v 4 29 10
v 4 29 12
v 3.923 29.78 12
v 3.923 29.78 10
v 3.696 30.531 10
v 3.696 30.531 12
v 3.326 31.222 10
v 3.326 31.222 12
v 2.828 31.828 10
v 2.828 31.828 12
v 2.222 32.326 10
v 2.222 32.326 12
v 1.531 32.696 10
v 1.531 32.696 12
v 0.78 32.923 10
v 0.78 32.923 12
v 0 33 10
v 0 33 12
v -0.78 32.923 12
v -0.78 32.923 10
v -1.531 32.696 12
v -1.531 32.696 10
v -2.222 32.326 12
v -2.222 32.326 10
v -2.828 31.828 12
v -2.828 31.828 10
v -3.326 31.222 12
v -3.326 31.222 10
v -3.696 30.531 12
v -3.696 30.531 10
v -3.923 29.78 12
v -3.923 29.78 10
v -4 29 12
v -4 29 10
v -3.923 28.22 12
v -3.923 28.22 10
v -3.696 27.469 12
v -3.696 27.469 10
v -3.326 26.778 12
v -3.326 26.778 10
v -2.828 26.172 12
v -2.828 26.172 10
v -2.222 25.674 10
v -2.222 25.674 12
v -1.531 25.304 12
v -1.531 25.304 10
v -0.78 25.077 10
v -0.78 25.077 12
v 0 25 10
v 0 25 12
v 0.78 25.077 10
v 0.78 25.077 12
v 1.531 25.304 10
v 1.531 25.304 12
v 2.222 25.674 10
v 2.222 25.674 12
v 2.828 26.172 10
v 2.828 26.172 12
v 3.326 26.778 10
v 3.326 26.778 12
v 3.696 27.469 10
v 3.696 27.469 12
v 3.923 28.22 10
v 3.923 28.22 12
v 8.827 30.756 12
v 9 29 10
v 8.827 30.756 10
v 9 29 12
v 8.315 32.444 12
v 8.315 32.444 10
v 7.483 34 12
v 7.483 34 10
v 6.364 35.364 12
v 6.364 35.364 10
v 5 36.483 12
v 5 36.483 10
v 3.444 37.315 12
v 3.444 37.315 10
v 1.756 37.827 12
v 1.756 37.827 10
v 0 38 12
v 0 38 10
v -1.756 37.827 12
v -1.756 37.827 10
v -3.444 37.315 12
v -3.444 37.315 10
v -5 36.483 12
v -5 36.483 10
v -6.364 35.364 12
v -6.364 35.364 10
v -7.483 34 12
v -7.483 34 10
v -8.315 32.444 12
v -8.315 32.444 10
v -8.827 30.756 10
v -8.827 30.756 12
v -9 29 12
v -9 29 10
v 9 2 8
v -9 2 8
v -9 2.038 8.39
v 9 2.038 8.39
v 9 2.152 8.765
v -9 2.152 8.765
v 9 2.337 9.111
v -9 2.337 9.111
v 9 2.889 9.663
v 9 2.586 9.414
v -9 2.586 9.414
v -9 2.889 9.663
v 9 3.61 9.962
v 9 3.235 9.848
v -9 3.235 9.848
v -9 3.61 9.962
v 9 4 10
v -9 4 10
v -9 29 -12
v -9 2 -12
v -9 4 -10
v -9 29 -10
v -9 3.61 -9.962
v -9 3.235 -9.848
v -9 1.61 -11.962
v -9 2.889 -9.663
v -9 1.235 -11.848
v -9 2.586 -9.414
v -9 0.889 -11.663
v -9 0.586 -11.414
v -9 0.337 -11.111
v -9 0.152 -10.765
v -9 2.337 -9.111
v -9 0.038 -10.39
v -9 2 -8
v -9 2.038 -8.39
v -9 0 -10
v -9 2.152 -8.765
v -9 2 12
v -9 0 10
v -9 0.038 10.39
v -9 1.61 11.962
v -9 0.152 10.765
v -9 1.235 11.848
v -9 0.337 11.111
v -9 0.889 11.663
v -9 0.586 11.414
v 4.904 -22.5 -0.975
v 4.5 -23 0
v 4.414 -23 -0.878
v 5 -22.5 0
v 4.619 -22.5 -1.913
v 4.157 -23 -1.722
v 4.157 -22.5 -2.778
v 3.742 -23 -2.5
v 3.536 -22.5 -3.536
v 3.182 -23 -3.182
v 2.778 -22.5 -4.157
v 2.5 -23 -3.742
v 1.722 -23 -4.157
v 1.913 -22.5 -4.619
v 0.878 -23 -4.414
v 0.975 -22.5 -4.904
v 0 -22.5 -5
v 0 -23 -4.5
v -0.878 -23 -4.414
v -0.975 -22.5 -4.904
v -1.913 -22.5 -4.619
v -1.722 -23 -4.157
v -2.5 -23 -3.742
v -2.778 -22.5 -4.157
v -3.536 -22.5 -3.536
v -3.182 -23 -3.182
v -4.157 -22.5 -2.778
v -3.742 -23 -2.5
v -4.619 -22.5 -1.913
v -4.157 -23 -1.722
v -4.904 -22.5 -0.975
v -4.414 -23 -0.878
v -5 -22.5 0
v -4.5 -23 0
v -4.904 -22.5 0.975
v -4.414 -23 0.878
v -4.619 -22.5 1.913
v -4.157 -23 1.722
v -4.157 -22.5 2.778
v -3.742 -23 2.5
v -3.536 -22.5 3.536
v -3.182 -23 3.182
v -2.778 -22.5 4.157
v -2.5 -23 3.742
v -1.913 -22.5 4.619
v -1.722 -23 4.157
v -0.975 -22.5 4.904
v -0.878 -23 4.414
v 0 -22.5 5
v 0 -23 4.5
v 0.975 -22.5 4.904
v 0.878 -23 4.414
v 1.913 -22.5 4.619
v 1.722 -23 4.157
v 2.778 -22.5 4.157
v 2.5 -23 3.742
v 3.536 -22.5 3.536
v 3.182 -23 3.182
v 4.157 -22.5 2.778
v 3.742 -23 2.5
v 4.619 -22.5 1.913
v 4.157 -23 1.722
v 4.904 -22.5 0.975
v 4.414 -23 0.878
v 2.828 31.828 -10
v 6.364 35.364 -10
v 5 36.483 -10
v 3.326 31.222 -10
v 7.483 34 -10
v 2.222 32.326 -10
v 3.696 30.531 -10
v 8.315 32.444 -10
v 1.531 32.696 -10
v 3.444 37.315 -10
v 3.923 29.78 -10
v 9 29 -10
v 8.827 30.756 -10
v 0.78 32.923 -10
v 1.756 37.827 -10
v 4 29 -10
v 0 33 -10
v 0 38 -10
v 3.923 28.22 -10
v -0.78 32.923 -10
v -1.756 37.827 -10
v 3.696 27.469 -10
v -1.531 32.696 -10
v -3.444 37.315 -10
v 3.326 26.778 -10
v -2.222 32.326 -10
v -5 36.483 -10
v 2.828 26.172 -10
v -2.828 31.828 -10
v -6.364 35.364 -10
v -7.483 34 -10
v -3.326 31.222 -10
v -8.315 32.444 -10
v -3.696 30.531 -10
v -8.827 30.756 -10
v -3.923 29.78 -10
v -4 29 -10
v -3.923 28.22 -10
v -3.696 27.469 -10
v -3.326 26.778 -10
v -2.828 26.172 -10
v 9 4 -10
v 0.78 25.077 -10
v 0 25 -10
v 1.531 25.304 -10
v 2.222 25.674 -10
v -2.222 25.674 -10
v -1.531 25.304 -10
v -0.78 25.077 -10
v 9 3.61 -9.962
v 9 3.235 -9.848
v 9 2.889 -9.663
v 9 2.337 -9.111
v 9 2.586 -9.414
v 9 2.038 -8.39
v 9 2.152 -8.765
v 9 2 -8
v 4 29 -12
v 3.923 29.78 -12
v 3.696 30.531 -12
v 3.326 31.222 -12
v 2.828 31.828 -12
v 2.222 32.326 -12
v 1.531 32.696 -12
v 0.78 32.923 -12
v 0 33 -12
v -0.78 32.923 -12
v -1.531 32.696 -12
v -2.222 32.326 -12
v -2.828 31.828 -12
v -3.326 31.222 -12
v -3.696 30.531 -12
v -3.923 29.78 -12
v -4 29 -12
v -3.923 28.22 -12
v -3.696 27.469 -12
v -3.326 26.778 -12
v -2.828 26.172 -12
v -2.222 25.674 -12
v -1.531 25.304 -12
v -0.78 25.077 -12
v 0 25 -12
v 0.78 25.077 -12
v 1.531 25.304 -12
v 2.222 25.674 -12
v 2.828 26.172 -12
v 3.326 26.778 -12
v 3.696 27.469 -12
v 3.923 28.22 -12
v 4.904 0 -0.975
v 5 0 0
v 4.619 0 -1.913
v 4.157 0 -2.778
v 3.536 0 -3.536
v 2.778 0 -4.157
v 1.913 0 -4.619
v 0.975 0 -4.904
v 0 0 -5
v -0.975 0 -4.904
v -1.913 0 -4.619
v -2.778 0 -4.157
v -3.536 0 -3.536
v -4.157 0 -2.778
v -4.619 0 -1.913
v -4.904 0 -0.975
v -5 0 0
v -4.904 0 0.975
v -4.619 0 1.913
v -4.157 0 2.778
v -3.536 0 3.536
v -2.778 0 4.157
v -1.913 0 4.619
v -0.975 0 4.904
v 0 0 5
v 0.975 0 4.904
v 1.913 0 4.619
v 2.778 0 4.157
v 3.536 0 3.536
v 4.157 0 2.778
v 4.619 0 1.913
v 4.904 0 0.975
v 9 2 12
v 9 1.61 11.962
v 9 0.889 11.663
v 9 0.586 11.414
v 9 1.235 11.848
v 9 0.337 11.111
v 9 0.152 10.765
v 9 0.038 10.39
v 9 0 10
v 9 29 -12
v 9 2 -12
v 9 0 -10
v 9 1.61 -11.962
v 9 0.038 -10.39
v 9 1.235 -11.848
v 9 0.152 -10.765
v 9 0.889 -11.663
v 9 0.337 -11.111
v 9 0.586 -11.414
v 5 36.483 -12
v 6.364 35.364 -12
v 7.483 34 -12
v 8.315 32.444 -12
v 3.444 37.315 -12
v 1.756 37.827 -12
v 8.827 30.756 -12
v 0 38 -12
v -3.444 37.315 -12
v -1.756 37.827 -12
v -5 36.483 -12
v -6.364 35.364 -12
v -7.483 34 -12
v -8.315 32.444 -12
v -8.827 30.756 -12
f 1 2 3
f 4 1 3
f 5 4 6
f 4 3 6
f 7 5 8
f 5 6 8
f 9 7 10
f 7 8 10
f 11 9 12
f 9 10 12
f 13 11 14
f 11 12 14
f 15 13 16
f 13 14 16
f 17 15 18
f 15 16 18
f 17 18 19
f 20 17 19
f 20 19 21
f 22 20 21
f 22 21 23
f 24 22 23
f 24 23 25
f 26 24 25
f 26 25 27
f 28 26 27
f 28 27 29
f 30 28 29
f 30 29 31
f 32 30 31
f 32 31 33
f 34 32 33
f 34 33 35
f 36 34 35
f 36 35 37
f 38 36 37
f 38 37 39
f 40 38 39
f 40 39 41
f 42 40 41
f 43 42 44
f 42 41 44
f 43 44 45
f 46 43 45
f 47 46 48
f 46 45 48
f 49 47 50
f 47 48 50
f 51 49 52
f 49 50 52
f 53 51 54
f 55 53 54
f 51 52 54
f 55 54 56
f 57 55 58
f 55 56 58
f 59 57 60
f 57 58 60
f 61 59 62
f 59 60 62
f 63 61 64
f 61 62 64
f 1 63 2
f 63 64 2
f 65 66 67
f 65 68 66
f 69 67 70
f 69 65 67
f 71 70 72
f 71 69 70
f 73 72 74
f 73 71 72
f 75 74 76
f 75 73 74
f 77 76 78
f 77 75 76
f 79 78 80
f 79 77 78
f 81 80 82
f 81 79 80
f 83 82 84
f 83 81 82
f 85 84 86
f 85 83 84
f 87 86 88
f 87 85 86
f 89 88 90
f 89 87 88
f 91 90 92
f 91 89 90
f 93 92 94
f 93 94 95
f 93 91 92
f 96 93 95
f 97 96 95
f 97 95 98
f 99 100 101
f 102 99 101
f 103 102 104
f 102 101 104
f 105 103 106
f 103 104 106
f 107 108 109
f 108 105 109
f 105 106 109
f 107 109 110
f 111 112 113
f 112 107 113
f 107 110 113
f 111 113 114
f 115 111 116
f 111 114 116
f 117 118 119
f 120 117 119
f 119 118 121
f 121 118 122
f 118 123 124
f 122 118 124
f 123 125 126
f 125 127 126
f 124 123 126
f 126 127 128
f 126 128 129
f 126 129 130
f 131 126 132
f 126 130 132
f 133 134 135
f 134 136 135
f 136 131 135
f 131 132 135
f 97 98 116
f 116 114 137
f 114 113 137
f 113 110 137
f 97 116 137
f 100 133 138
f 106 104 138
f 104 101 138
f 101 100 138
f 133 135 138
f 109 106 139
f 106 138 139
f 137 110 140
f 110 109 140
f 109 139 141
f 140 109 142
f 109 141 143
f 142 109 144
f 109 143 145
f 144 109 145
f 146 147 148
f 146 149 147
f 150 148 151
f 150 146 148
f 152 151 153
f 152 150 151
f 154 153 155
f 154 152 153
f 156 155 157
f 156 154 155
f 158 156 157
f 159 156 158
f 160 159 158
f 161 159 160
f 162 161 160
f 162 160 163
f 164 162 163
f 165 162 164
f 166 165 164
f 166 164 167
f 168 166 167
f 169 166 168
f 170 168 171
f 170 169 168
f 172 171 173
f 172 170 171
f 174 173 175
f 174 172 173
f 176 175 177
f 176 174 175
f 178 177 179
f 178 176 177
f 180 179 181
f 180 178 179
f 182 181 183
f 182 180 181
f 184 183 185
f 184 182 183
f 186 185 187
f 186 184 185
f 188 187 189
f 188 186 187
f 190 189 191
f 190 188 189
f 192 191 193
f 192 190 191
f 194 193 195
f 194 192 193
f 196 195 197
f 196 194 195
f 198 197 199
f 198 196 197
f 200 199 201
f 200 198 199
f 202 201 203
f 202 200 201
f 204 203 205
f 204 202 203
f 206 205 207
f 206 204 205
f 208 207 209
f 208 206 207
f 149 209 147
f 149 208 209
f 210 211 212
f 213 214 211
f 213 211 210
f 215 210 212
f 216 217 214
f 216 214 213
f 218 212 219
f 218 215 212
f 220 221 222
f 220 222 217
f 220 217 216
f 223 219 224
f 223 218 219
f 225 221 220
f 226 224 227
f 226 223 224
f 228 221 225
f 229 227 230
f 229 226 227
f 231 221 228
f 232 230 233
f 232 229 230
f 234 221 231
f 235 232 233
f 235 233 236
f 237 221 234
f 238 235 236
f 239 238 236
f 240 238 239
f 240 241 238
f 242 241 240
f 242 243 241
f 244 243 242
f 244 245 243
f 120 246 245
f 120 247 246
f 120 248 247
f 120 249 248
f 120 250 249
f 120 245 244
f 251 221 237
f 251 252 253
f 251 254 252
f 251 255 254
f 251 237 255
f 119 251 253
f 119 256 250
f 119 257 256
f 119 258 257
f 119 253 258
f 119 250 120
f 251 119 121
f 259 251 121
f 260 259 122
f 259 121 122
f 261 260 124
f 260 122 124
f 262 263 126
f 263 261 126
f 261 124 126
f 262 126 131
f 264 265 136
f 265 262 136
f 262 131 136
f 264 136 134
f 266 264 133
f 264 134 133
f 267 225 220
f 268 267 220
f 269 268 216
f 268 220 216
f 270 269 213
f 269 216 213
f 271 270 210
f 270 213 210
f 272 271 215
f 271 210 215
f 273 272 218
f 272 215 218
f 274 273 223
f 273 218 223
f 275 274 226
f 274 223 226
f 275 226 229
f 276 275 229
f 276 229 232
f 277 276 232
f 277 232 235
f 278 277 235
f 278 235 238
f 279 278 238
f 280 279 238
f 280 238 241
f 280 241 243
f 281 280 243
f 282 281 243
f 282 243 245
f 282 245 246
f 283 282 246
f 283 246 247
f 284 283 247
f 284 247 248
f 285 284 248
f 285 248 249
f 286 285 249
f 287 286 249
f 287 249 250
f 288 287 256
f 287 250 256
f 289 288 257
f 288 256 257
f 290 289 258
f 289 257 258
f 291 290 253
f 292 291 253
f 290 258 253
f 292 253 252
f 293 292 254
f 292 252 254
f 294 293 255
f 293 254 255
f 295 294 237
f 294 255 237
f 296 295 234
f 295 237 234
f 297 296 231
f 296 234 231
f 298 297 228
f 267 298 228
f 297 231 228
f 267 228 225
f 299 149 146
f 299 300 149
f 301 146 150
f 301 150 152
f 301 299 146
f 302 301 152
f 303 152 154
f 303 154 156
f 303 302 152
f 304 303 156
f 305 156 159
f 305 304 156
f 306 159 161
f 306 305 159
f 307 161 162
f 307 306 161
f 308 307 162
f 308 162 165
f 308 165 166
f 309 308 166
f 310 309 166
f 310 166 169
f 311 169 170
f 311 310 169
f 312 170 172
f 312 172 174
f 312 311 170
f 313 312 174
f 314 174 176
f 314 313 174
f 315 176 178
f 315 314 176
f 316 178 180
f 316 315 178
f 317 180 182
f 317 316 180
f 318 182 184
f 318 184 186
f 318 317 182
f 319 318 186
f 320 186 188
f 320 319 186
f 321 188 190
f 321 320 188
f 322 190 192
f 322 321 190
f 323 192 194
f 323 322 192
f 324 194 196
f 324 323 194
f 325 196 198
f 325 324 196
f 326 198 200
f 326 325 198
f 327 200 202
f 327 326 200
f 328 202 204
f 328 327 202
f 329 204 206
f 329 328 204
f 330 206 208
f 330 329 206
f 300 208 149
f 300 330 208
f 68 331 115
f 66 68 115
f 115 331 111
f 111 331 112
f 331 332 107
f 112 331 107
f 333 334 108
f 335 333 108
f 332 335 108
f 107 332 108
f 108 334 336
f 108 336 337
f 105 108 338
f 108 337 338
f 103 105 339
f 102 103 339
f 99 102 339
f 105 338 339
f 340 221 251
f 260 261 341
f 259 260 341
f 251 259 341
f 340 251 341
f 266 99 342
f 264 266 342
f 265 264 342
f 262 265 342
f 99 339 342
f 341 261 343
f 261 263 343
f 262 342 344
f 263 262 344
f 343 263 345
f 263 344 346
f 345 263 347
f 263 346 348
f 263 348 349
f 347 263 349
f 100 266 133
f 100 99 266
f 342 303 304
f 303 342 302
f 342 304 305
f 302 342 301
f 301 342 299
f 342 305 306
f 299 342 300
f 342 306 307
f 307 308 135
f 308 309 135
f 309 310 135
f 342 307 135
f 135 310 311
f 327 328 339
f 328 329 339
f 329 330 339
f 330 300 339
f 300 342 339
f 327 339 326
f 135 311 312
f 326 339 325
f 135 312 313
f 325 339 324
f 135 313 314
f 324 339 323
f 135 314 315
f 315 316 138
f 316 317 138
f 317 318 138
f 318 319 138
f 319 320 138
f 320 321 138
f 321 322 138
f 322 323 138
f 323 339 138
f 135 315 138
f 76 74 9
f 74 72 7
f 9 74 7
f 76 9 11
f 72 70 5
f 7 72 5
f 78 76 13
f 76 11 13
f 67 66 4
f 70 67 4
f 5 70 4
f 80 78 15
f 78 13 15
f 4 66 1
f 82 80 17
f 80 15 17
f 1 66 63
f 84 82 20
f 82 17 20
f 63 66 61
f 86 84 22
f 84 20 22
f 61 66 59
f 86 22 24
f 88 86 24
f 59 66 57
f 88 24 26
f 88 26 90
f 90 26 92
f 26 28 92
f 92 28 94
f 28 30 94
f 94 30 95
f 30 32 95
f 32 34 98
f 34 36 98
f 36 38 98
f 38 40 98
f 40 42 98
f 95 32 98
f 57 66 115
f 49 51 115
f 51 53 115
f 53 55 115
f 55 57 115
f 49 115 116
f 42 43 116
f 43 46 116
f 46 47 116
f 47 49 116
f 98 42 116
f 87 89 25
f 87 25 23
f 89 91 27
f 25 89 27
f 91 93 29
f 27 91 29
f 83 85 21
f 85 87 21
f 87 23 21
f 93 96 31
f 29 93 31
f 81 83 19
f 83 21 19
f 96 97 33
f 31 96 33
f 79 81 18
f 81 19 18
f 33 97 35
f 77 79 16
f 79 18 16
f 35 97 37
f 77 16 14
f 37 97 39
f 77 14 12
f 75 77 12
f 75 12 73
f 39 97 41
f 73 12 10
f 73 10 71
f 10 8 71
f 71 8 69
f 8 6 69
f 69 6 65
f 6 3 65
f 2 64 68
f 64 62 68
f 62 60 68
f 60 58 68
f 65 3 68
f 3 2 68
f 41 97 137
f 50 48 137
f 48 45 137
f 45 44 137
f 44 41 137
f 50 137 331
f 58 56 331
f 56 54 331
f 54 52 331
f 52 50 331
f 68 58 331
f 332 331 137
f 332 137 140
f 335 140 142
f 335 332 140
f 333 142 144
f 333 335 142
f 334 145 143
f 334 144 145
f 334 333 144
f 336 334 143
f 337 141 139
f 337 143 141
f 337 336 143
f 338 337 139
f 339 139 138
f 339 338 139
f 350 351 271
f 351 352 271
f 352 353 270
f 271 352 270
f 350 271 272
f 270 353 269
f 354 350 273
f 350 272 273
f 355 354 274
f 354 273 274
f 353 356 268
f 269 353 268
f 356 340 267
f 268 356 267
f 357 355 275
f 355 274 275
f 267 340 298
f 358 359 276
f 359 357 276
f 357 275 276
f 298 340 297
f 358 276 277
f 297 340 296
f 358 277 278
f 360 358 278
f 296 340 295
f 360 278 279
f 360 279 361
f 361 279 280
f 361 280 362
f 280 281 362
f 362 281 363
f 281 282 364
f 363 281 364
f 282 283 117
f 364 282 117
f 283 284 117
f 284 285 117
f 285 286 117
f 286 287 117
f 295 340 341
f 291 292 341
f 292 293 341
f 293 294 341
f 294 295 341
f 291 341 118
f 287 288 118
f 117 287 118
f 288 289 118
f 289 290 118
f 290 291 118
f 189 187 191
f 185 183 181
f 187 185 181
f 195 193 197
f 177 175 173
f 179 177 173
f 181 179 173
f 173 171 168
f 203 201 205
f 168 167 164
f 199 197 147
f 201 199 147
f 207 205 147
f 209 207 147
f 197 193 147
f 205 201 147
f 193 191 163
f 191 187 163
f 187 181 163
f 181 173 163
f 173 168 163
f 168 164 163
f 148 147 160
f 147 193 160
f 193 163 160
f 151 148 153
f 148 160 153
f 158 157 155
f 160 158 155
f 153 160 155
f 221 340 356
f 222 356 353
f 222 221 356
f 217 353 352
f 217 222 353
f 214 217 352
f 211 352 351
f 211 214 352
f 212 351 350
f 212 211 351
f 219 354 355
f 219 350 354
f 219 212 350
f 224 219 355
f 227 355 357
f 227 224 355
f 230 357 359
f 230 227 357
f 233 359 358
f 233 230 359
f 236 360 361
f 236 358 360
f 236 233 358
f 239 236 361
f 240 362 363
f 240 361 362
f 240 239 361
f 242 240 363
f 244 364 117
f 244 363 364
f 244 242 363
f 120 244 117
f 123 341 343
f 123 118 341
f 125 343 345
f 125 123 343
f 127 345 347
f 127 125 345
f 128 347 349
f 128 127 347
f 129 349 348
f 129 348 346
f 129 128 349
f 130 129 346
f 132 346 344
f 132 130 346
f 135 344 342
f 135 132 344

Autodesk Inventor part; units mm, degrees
ref_plane "YZ Plane" through (0, 0, 0) normal (1, 0, 0) x (0, 1, 0)
ref_plane "XZ Plane" through (0, 0, 0) normal (0, 1, 0) x (-1, 0, 0)
ref_plane "XY Plane" through (0, 0, 0) normal (0, 0, 1) x (1, 0, 0)
sketch "Sketch1" plane through (0, 0, 0) normal (0, 1, 0) x (-1, 0, 0)
  line L0 (9, 12) -> (-9, 12)
  line L1 (-9, 12) -> (-9, -12)
  line L2 (-9, -12) -> (9, -12)
  line L3 (9, -12) -> (9, 12)
  line L4 (9, 12) -> (-9, -12) construction
  line L5 (-9, 12) -> (9, -12) construction
  point P0 (0, 0)
  dimension "d0" = 24
  dimension "d1" = 18
extrude "Extrusion1" add sketch "Sketch1" along normal blind 2
sketch "Sketch2" plane through (0, 2, 0) normal (0, 1, 0) x (1, 0, 0)
  line L0 (-9, 12) -> (-9, -12) projected
  line L1 (9, -12) -> (9, 12) projected
  line L2 (-9, -12) -> (9, -12)
  line L3 (9, -12) -> (9, -10)
  line L4 (9, -10) -> (-9, -10)
  line L5 (-9, -10) -> (-9, -12)
  line L6 (9, 12) -> (-9, 12) projected
  line L7 (-9, 12) -> (9, 12)
  line L8 (9, 12) -> (9, 10)
  line L9 (9, 10) -> (-9, 10)
  line L10 (-9, 10) -> (-9, 12)
  point P0 (0, 0)
  dimension "d4" = 2
  dimension "d5" = 2
extrude "Extrusion2" add sketch "Sketch2" along normal blind 36 contours L6 L1 L9 L0 | L4 L1 L2 L0
sketch "Sketch5" plane through (-9, 0, 12) normal (0, 0, 1) x (1, 0, 0)
  line L0 (0, 29) -> (18, 29)
  line L1 (0, 38) -> (18, 38) projected
  arc A0 (18, 29) -> (0, 29) centre (9, 29) ccw
  circle A1 centre (9, 29) radius 4
  line L2 (0, 0) -> (0, 38) projected
  line L3 (0, 29) -> (0, 38)
  line L4 (18, 38) -> (0, 38) projected
  line L5 (0, 38) -> (18, 38)
  line L6 (18, 38) -> (18, 29)
  point P0 (9, 0)
  dimension "d16" = 9
  dimension "d17" = 8
extrude "Extrusion4" cut sketch "Sketch5" against normal blind 40 contours A1 L0 | L0 A1 | A0 L1 L6 | A0 L2 L1
sketch "Sketch6" plane through (0, 0, 0) normal (0, -1, 0) x (1, 0, 0)
  circle A0 centre (0, 0) radius 4
  dimension "d20" = 8
extrude "Extrusion5" cut sketch "Sketch6" against normal blind 40
fillet "Fillet1" radius 2 4 edges at (0, 0, 12) (0, 0, -12) (0, 2, 10) (0, 2, -10)
sketch "Sketch11" plane through (0, 2, 0) normal (0, 1, 0) x (1, 0, 0)
  circle A0 centre (0, 0) radius 5
  dimension "d29" = 10
extrude "Extrusion7" add sketch "Sketch11" against normal blind 25
thread "Thread2" size "M10x1.5" class "6g" standard "ANSI Metric M Profile" full length
chamfer "Chamfer1" distance 0.5 angle 45 1 edges at (-5, -23, 0)
properties part number "Giá đỡ ròng rọc"
